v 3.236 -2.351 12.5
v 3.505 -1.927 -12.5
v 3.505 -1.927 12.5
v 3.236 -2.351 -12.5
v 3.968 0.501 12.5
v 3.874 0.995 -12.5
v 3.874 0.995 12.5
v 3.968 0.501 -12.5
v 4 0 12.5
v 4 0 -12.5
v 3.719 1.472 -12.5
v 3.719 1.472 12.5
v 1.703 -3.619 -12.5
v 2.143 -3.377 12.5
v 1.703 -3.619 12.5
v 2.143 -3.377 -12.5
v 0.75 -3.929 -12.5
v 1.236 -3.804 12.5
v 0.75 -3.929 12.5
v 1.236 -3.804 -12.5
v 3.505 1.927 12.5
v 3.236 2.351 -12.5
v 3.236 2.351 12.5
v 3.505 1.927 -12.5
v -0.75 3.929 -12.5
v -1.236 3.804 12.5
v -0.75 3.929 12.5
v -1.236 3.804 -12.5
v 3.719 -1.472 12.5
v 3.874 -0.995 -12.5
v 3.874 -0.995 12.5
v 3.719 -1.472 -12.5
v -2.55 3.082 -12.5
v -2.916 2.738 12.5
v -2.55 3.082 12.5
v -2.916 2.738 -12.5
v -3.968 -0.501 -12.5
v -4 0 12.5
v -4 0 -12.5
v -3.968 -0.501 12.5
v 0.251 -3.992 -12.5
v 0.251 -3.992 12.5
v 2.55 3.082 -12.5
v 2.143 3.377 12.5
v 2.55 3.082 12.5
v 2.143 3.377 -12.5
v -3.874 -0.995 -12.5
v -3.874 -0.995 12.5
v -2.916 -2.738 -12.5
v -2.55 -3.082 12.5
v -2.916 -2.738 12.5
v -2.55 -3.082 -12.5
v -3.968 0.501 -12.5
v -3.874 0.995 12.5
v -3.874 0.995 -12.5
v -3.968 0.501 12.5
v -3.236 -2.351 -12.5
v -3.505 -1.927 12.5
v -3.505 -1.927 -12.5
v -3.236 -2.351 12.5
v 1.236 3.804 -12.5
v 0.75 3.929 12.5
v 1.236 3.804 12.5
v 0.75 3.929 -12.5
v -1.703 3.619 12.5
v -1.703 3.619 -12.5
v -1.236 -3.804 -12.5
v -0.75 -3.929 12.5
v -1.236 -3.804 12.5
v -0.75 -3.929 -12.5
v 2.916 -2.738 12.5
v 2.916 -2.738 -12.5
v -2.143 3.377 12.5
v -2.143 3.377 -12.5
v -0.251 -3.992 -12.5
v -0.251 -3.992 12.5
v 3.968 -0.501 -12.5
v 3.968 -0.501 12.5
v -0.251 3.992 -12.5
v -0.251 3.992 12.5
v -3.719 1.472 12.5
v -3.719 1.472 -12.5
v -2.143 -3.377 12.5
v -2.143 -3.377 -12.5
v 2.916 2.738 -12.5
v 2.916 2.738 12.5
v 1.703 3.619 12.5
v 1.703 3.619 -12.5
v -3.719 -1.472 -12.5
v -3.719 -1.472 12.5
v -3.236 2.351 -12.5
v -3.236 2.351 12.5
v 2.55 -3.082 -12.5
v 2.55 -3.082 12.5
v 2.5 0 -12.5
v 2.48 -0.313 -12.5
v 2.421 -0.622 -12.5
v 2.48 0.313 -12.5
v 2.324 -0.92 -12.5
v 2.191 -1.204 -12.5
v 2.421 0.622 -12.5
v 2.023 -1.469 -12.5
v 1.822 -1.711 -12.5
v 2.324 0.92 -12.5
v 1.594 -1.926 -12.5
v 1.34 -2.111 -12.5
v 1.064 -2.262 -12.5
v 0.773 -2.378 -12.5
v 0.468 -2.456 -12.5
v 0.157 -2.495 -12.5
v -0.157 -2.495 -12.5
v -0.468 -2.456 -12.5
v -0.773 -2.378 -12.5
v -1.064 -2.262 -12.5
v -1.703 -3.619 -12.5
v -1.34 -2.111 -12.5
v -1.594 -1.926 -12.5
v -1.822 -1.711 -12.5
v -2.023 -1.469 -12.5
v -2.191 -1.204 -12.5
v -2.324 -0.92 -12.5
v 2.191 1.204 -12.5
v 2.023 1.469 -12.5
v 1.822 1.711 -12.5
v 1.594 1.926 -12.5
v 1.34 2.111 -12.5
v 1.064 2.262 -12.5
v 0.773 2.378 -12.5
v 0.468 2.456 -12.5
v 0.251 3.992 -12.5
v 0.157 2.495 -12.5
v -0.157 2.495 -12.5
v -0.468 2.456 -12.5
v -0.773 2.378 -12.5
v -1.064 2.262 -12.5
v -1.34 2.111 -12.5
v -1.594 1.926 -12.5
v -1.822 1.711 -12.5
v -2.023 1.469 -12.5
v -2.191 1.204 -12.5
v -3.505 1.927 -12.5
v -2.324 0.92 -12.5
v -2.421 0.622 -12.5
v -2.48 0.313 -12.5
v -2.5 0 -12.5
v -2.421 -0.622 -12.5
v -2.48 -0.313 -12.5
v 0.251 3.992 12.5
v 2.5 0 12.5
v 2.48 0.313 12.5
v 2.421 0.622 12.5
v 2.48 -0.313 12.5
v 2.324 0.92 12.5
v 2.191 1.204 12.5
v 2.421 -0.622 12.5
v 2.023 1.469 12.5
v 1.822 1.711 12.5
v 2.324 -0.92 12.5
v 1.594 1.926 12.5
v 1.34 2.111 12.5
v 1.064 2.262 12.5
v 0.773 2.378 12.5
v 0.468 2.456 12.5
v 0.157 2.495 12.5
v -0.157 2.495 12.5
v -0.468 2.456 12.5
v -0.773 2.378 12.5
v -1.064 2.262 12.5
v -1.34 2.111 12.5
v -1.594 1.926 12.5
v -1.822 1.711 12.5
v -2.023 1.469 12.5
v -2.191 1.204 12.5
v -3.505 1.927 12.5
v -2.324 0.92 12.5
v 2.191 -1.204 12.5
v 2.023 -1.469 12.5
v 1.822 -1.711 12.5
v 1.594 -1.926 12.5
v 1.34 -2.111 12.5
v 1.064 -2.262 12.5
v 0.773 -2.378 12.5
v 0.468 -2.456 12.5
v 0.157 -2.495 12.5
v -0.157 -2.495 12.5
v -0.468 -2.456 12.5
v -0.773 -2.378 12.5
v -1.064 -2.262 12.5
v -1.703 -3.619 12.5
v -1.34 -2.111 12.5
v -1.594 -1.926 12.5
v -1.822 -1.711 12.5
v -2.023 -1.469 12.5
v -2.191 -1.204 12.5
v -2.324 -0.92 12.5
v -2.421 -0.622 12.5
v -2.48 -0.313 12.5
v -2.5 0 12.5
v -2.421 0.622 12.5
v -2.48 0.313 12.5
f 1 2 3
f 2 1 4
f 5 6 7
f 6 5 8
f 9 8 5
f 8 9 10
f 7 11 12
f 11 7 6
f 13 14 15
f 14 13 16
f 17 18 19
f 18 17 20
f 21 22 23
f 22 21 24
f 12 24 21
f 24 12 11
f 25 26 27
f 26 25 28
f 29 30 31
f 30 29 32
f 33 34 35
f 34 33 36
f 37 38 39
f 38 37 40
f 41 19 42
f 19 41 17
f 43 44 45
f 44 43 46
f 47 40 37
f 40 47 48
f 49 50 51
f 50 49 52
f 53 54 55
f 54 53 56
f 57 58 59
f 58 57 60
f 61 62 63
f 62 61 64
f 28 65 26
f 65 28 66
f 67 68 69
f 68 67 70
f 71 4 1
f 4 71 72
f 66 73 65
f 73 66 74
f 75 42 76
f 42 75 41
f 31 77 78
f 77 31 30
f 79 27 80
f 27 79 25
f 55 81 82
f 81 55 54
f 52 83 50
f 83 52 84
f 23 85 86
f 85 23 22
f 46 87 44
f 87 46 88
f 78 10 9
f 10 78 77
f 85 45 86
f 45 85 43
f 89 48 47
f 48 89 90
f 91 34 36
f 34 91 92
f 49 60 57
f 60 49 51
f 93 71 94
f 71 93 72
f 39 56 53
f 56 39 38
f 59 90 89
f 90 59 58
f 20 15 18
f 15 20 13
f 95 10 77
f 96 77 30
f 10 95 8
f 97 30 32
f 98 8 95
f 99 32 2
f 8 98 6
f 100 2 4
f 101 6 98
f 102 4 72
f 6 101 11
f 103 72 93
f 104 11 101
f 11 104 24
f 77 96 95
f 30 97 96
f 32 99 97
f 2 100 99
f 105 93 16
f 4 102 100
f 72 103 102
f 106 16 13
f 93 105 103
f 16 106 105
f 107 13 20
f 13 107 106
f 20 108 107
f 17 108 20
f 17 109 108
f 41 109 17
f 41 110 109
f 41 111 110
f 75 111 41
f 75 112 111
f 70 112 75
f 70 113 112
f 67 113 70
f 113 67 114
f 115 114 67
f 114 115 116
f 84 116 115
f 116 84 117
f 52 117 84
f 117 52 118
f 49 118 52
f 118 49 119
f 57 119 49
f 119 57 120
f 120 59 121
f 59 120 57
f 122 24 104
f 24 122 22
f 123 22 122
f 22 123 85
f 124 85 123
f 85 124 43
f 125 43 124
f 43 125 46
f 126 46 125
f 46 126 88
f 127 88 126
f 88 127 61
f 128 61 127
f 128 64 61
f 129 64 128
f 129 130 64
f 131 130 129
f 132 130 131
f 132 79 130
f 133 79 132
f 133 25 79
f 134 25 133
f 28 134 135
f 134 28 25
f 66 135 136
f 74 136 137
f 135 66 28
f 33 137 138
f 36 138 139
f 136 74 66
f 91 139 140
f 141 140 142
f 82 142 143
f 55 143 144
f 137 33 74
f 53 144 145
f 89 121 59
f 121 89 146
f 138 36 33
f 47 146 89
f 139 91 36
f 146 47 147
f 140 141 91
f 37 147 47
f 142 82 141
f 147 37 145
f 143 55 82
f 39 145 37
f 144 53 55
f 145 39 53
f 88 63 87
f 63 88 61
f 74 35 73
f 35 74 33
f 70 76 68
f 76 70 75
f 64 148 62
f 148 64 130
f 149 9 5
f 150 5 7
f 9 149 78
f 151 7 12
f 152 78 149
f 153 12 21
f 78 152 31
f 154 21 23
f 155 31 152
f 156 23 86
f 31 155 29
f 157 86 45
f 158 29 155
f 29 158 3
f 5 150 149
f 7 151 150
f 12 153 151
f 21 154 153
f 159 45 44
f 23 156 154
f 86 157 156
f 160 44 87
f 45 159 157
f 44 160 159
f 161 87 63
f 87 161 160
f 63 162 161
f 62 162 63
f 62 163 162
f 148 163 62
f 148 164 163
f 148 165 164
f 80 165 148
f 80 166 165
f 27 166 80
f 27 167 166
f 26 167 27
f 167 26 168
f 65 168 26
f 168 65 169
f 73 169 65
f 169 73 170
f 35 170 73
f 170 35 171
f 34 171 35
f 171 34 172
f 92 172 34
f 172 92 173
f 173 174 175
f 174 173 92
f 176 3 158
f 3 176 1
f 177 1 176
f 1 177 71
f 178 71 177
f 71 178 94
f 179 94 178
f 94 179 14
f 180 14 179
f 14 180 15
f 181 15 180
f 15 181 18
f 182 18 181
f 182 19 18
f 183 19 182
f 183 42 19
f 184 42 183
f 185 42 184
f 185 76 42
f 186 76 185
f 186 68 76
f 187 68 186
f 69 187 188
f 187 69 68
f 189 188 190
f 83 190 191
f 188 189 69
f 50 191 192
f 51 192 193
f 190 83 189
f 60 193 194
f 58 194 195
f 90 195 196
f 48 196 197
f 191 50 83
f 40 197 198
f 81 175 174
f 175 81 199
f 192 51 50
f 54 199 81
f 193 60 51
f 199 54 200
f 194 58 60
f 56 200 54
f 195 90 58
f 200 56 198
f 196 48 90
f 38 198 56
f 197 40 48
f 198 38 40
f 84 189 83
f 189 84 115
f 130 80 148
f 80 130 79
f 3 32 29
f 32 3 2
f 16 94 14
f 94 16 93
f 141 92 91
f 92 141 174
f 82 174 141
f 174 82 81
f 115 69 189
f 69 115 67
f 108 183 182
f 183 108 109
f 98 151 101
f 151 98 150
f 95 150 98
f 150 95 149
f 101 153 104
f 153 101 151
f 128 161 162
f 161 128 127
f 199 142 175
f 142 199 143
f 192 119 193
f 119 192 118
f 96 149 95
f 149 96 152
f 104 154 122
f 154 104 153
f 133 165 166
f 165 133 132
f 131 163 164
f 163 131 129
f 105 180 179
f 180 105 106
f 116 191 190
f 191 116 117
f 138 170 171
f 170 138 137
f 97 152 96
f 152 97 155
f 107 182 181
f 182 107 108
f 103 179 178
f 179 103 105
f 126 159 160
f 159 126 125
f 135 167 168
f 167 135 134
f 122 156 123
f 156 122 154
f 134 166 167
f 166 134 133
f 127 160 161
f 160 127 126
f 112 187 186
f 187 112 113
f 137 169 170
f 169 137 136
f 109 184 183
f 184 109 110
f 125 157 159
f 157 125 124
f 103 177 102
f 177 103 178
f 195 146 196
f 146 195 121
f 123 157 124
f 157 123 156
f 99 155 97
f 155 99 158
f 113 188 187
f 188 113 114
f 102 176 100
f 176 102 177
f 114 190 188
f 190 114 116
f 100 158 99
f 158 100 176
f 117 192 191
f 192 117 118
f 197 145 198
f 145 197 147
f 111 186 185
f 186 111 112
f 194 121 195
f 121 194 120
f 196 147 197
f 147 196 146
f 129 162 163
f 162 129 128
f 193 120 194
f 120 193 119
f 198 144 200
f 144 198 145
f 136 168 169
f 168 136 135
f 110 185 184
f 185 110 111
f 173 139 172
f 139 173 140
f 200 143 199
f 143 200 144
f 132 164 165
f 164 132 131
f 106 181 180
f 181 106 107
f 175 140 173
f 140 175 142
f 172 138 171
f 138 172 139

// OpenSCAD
$fn = 50;


difference() {
	union() {
		translate(v = [0, 0, -12.5000000000]) {
			cylinder(h = 25, r = 4.0000000000);
		}
	}
	union() {
		translate(v = [0, 0, -100.0000000000]) {
			cylinder(h = 200, r = 2.5000000000);
		}
	}
}
